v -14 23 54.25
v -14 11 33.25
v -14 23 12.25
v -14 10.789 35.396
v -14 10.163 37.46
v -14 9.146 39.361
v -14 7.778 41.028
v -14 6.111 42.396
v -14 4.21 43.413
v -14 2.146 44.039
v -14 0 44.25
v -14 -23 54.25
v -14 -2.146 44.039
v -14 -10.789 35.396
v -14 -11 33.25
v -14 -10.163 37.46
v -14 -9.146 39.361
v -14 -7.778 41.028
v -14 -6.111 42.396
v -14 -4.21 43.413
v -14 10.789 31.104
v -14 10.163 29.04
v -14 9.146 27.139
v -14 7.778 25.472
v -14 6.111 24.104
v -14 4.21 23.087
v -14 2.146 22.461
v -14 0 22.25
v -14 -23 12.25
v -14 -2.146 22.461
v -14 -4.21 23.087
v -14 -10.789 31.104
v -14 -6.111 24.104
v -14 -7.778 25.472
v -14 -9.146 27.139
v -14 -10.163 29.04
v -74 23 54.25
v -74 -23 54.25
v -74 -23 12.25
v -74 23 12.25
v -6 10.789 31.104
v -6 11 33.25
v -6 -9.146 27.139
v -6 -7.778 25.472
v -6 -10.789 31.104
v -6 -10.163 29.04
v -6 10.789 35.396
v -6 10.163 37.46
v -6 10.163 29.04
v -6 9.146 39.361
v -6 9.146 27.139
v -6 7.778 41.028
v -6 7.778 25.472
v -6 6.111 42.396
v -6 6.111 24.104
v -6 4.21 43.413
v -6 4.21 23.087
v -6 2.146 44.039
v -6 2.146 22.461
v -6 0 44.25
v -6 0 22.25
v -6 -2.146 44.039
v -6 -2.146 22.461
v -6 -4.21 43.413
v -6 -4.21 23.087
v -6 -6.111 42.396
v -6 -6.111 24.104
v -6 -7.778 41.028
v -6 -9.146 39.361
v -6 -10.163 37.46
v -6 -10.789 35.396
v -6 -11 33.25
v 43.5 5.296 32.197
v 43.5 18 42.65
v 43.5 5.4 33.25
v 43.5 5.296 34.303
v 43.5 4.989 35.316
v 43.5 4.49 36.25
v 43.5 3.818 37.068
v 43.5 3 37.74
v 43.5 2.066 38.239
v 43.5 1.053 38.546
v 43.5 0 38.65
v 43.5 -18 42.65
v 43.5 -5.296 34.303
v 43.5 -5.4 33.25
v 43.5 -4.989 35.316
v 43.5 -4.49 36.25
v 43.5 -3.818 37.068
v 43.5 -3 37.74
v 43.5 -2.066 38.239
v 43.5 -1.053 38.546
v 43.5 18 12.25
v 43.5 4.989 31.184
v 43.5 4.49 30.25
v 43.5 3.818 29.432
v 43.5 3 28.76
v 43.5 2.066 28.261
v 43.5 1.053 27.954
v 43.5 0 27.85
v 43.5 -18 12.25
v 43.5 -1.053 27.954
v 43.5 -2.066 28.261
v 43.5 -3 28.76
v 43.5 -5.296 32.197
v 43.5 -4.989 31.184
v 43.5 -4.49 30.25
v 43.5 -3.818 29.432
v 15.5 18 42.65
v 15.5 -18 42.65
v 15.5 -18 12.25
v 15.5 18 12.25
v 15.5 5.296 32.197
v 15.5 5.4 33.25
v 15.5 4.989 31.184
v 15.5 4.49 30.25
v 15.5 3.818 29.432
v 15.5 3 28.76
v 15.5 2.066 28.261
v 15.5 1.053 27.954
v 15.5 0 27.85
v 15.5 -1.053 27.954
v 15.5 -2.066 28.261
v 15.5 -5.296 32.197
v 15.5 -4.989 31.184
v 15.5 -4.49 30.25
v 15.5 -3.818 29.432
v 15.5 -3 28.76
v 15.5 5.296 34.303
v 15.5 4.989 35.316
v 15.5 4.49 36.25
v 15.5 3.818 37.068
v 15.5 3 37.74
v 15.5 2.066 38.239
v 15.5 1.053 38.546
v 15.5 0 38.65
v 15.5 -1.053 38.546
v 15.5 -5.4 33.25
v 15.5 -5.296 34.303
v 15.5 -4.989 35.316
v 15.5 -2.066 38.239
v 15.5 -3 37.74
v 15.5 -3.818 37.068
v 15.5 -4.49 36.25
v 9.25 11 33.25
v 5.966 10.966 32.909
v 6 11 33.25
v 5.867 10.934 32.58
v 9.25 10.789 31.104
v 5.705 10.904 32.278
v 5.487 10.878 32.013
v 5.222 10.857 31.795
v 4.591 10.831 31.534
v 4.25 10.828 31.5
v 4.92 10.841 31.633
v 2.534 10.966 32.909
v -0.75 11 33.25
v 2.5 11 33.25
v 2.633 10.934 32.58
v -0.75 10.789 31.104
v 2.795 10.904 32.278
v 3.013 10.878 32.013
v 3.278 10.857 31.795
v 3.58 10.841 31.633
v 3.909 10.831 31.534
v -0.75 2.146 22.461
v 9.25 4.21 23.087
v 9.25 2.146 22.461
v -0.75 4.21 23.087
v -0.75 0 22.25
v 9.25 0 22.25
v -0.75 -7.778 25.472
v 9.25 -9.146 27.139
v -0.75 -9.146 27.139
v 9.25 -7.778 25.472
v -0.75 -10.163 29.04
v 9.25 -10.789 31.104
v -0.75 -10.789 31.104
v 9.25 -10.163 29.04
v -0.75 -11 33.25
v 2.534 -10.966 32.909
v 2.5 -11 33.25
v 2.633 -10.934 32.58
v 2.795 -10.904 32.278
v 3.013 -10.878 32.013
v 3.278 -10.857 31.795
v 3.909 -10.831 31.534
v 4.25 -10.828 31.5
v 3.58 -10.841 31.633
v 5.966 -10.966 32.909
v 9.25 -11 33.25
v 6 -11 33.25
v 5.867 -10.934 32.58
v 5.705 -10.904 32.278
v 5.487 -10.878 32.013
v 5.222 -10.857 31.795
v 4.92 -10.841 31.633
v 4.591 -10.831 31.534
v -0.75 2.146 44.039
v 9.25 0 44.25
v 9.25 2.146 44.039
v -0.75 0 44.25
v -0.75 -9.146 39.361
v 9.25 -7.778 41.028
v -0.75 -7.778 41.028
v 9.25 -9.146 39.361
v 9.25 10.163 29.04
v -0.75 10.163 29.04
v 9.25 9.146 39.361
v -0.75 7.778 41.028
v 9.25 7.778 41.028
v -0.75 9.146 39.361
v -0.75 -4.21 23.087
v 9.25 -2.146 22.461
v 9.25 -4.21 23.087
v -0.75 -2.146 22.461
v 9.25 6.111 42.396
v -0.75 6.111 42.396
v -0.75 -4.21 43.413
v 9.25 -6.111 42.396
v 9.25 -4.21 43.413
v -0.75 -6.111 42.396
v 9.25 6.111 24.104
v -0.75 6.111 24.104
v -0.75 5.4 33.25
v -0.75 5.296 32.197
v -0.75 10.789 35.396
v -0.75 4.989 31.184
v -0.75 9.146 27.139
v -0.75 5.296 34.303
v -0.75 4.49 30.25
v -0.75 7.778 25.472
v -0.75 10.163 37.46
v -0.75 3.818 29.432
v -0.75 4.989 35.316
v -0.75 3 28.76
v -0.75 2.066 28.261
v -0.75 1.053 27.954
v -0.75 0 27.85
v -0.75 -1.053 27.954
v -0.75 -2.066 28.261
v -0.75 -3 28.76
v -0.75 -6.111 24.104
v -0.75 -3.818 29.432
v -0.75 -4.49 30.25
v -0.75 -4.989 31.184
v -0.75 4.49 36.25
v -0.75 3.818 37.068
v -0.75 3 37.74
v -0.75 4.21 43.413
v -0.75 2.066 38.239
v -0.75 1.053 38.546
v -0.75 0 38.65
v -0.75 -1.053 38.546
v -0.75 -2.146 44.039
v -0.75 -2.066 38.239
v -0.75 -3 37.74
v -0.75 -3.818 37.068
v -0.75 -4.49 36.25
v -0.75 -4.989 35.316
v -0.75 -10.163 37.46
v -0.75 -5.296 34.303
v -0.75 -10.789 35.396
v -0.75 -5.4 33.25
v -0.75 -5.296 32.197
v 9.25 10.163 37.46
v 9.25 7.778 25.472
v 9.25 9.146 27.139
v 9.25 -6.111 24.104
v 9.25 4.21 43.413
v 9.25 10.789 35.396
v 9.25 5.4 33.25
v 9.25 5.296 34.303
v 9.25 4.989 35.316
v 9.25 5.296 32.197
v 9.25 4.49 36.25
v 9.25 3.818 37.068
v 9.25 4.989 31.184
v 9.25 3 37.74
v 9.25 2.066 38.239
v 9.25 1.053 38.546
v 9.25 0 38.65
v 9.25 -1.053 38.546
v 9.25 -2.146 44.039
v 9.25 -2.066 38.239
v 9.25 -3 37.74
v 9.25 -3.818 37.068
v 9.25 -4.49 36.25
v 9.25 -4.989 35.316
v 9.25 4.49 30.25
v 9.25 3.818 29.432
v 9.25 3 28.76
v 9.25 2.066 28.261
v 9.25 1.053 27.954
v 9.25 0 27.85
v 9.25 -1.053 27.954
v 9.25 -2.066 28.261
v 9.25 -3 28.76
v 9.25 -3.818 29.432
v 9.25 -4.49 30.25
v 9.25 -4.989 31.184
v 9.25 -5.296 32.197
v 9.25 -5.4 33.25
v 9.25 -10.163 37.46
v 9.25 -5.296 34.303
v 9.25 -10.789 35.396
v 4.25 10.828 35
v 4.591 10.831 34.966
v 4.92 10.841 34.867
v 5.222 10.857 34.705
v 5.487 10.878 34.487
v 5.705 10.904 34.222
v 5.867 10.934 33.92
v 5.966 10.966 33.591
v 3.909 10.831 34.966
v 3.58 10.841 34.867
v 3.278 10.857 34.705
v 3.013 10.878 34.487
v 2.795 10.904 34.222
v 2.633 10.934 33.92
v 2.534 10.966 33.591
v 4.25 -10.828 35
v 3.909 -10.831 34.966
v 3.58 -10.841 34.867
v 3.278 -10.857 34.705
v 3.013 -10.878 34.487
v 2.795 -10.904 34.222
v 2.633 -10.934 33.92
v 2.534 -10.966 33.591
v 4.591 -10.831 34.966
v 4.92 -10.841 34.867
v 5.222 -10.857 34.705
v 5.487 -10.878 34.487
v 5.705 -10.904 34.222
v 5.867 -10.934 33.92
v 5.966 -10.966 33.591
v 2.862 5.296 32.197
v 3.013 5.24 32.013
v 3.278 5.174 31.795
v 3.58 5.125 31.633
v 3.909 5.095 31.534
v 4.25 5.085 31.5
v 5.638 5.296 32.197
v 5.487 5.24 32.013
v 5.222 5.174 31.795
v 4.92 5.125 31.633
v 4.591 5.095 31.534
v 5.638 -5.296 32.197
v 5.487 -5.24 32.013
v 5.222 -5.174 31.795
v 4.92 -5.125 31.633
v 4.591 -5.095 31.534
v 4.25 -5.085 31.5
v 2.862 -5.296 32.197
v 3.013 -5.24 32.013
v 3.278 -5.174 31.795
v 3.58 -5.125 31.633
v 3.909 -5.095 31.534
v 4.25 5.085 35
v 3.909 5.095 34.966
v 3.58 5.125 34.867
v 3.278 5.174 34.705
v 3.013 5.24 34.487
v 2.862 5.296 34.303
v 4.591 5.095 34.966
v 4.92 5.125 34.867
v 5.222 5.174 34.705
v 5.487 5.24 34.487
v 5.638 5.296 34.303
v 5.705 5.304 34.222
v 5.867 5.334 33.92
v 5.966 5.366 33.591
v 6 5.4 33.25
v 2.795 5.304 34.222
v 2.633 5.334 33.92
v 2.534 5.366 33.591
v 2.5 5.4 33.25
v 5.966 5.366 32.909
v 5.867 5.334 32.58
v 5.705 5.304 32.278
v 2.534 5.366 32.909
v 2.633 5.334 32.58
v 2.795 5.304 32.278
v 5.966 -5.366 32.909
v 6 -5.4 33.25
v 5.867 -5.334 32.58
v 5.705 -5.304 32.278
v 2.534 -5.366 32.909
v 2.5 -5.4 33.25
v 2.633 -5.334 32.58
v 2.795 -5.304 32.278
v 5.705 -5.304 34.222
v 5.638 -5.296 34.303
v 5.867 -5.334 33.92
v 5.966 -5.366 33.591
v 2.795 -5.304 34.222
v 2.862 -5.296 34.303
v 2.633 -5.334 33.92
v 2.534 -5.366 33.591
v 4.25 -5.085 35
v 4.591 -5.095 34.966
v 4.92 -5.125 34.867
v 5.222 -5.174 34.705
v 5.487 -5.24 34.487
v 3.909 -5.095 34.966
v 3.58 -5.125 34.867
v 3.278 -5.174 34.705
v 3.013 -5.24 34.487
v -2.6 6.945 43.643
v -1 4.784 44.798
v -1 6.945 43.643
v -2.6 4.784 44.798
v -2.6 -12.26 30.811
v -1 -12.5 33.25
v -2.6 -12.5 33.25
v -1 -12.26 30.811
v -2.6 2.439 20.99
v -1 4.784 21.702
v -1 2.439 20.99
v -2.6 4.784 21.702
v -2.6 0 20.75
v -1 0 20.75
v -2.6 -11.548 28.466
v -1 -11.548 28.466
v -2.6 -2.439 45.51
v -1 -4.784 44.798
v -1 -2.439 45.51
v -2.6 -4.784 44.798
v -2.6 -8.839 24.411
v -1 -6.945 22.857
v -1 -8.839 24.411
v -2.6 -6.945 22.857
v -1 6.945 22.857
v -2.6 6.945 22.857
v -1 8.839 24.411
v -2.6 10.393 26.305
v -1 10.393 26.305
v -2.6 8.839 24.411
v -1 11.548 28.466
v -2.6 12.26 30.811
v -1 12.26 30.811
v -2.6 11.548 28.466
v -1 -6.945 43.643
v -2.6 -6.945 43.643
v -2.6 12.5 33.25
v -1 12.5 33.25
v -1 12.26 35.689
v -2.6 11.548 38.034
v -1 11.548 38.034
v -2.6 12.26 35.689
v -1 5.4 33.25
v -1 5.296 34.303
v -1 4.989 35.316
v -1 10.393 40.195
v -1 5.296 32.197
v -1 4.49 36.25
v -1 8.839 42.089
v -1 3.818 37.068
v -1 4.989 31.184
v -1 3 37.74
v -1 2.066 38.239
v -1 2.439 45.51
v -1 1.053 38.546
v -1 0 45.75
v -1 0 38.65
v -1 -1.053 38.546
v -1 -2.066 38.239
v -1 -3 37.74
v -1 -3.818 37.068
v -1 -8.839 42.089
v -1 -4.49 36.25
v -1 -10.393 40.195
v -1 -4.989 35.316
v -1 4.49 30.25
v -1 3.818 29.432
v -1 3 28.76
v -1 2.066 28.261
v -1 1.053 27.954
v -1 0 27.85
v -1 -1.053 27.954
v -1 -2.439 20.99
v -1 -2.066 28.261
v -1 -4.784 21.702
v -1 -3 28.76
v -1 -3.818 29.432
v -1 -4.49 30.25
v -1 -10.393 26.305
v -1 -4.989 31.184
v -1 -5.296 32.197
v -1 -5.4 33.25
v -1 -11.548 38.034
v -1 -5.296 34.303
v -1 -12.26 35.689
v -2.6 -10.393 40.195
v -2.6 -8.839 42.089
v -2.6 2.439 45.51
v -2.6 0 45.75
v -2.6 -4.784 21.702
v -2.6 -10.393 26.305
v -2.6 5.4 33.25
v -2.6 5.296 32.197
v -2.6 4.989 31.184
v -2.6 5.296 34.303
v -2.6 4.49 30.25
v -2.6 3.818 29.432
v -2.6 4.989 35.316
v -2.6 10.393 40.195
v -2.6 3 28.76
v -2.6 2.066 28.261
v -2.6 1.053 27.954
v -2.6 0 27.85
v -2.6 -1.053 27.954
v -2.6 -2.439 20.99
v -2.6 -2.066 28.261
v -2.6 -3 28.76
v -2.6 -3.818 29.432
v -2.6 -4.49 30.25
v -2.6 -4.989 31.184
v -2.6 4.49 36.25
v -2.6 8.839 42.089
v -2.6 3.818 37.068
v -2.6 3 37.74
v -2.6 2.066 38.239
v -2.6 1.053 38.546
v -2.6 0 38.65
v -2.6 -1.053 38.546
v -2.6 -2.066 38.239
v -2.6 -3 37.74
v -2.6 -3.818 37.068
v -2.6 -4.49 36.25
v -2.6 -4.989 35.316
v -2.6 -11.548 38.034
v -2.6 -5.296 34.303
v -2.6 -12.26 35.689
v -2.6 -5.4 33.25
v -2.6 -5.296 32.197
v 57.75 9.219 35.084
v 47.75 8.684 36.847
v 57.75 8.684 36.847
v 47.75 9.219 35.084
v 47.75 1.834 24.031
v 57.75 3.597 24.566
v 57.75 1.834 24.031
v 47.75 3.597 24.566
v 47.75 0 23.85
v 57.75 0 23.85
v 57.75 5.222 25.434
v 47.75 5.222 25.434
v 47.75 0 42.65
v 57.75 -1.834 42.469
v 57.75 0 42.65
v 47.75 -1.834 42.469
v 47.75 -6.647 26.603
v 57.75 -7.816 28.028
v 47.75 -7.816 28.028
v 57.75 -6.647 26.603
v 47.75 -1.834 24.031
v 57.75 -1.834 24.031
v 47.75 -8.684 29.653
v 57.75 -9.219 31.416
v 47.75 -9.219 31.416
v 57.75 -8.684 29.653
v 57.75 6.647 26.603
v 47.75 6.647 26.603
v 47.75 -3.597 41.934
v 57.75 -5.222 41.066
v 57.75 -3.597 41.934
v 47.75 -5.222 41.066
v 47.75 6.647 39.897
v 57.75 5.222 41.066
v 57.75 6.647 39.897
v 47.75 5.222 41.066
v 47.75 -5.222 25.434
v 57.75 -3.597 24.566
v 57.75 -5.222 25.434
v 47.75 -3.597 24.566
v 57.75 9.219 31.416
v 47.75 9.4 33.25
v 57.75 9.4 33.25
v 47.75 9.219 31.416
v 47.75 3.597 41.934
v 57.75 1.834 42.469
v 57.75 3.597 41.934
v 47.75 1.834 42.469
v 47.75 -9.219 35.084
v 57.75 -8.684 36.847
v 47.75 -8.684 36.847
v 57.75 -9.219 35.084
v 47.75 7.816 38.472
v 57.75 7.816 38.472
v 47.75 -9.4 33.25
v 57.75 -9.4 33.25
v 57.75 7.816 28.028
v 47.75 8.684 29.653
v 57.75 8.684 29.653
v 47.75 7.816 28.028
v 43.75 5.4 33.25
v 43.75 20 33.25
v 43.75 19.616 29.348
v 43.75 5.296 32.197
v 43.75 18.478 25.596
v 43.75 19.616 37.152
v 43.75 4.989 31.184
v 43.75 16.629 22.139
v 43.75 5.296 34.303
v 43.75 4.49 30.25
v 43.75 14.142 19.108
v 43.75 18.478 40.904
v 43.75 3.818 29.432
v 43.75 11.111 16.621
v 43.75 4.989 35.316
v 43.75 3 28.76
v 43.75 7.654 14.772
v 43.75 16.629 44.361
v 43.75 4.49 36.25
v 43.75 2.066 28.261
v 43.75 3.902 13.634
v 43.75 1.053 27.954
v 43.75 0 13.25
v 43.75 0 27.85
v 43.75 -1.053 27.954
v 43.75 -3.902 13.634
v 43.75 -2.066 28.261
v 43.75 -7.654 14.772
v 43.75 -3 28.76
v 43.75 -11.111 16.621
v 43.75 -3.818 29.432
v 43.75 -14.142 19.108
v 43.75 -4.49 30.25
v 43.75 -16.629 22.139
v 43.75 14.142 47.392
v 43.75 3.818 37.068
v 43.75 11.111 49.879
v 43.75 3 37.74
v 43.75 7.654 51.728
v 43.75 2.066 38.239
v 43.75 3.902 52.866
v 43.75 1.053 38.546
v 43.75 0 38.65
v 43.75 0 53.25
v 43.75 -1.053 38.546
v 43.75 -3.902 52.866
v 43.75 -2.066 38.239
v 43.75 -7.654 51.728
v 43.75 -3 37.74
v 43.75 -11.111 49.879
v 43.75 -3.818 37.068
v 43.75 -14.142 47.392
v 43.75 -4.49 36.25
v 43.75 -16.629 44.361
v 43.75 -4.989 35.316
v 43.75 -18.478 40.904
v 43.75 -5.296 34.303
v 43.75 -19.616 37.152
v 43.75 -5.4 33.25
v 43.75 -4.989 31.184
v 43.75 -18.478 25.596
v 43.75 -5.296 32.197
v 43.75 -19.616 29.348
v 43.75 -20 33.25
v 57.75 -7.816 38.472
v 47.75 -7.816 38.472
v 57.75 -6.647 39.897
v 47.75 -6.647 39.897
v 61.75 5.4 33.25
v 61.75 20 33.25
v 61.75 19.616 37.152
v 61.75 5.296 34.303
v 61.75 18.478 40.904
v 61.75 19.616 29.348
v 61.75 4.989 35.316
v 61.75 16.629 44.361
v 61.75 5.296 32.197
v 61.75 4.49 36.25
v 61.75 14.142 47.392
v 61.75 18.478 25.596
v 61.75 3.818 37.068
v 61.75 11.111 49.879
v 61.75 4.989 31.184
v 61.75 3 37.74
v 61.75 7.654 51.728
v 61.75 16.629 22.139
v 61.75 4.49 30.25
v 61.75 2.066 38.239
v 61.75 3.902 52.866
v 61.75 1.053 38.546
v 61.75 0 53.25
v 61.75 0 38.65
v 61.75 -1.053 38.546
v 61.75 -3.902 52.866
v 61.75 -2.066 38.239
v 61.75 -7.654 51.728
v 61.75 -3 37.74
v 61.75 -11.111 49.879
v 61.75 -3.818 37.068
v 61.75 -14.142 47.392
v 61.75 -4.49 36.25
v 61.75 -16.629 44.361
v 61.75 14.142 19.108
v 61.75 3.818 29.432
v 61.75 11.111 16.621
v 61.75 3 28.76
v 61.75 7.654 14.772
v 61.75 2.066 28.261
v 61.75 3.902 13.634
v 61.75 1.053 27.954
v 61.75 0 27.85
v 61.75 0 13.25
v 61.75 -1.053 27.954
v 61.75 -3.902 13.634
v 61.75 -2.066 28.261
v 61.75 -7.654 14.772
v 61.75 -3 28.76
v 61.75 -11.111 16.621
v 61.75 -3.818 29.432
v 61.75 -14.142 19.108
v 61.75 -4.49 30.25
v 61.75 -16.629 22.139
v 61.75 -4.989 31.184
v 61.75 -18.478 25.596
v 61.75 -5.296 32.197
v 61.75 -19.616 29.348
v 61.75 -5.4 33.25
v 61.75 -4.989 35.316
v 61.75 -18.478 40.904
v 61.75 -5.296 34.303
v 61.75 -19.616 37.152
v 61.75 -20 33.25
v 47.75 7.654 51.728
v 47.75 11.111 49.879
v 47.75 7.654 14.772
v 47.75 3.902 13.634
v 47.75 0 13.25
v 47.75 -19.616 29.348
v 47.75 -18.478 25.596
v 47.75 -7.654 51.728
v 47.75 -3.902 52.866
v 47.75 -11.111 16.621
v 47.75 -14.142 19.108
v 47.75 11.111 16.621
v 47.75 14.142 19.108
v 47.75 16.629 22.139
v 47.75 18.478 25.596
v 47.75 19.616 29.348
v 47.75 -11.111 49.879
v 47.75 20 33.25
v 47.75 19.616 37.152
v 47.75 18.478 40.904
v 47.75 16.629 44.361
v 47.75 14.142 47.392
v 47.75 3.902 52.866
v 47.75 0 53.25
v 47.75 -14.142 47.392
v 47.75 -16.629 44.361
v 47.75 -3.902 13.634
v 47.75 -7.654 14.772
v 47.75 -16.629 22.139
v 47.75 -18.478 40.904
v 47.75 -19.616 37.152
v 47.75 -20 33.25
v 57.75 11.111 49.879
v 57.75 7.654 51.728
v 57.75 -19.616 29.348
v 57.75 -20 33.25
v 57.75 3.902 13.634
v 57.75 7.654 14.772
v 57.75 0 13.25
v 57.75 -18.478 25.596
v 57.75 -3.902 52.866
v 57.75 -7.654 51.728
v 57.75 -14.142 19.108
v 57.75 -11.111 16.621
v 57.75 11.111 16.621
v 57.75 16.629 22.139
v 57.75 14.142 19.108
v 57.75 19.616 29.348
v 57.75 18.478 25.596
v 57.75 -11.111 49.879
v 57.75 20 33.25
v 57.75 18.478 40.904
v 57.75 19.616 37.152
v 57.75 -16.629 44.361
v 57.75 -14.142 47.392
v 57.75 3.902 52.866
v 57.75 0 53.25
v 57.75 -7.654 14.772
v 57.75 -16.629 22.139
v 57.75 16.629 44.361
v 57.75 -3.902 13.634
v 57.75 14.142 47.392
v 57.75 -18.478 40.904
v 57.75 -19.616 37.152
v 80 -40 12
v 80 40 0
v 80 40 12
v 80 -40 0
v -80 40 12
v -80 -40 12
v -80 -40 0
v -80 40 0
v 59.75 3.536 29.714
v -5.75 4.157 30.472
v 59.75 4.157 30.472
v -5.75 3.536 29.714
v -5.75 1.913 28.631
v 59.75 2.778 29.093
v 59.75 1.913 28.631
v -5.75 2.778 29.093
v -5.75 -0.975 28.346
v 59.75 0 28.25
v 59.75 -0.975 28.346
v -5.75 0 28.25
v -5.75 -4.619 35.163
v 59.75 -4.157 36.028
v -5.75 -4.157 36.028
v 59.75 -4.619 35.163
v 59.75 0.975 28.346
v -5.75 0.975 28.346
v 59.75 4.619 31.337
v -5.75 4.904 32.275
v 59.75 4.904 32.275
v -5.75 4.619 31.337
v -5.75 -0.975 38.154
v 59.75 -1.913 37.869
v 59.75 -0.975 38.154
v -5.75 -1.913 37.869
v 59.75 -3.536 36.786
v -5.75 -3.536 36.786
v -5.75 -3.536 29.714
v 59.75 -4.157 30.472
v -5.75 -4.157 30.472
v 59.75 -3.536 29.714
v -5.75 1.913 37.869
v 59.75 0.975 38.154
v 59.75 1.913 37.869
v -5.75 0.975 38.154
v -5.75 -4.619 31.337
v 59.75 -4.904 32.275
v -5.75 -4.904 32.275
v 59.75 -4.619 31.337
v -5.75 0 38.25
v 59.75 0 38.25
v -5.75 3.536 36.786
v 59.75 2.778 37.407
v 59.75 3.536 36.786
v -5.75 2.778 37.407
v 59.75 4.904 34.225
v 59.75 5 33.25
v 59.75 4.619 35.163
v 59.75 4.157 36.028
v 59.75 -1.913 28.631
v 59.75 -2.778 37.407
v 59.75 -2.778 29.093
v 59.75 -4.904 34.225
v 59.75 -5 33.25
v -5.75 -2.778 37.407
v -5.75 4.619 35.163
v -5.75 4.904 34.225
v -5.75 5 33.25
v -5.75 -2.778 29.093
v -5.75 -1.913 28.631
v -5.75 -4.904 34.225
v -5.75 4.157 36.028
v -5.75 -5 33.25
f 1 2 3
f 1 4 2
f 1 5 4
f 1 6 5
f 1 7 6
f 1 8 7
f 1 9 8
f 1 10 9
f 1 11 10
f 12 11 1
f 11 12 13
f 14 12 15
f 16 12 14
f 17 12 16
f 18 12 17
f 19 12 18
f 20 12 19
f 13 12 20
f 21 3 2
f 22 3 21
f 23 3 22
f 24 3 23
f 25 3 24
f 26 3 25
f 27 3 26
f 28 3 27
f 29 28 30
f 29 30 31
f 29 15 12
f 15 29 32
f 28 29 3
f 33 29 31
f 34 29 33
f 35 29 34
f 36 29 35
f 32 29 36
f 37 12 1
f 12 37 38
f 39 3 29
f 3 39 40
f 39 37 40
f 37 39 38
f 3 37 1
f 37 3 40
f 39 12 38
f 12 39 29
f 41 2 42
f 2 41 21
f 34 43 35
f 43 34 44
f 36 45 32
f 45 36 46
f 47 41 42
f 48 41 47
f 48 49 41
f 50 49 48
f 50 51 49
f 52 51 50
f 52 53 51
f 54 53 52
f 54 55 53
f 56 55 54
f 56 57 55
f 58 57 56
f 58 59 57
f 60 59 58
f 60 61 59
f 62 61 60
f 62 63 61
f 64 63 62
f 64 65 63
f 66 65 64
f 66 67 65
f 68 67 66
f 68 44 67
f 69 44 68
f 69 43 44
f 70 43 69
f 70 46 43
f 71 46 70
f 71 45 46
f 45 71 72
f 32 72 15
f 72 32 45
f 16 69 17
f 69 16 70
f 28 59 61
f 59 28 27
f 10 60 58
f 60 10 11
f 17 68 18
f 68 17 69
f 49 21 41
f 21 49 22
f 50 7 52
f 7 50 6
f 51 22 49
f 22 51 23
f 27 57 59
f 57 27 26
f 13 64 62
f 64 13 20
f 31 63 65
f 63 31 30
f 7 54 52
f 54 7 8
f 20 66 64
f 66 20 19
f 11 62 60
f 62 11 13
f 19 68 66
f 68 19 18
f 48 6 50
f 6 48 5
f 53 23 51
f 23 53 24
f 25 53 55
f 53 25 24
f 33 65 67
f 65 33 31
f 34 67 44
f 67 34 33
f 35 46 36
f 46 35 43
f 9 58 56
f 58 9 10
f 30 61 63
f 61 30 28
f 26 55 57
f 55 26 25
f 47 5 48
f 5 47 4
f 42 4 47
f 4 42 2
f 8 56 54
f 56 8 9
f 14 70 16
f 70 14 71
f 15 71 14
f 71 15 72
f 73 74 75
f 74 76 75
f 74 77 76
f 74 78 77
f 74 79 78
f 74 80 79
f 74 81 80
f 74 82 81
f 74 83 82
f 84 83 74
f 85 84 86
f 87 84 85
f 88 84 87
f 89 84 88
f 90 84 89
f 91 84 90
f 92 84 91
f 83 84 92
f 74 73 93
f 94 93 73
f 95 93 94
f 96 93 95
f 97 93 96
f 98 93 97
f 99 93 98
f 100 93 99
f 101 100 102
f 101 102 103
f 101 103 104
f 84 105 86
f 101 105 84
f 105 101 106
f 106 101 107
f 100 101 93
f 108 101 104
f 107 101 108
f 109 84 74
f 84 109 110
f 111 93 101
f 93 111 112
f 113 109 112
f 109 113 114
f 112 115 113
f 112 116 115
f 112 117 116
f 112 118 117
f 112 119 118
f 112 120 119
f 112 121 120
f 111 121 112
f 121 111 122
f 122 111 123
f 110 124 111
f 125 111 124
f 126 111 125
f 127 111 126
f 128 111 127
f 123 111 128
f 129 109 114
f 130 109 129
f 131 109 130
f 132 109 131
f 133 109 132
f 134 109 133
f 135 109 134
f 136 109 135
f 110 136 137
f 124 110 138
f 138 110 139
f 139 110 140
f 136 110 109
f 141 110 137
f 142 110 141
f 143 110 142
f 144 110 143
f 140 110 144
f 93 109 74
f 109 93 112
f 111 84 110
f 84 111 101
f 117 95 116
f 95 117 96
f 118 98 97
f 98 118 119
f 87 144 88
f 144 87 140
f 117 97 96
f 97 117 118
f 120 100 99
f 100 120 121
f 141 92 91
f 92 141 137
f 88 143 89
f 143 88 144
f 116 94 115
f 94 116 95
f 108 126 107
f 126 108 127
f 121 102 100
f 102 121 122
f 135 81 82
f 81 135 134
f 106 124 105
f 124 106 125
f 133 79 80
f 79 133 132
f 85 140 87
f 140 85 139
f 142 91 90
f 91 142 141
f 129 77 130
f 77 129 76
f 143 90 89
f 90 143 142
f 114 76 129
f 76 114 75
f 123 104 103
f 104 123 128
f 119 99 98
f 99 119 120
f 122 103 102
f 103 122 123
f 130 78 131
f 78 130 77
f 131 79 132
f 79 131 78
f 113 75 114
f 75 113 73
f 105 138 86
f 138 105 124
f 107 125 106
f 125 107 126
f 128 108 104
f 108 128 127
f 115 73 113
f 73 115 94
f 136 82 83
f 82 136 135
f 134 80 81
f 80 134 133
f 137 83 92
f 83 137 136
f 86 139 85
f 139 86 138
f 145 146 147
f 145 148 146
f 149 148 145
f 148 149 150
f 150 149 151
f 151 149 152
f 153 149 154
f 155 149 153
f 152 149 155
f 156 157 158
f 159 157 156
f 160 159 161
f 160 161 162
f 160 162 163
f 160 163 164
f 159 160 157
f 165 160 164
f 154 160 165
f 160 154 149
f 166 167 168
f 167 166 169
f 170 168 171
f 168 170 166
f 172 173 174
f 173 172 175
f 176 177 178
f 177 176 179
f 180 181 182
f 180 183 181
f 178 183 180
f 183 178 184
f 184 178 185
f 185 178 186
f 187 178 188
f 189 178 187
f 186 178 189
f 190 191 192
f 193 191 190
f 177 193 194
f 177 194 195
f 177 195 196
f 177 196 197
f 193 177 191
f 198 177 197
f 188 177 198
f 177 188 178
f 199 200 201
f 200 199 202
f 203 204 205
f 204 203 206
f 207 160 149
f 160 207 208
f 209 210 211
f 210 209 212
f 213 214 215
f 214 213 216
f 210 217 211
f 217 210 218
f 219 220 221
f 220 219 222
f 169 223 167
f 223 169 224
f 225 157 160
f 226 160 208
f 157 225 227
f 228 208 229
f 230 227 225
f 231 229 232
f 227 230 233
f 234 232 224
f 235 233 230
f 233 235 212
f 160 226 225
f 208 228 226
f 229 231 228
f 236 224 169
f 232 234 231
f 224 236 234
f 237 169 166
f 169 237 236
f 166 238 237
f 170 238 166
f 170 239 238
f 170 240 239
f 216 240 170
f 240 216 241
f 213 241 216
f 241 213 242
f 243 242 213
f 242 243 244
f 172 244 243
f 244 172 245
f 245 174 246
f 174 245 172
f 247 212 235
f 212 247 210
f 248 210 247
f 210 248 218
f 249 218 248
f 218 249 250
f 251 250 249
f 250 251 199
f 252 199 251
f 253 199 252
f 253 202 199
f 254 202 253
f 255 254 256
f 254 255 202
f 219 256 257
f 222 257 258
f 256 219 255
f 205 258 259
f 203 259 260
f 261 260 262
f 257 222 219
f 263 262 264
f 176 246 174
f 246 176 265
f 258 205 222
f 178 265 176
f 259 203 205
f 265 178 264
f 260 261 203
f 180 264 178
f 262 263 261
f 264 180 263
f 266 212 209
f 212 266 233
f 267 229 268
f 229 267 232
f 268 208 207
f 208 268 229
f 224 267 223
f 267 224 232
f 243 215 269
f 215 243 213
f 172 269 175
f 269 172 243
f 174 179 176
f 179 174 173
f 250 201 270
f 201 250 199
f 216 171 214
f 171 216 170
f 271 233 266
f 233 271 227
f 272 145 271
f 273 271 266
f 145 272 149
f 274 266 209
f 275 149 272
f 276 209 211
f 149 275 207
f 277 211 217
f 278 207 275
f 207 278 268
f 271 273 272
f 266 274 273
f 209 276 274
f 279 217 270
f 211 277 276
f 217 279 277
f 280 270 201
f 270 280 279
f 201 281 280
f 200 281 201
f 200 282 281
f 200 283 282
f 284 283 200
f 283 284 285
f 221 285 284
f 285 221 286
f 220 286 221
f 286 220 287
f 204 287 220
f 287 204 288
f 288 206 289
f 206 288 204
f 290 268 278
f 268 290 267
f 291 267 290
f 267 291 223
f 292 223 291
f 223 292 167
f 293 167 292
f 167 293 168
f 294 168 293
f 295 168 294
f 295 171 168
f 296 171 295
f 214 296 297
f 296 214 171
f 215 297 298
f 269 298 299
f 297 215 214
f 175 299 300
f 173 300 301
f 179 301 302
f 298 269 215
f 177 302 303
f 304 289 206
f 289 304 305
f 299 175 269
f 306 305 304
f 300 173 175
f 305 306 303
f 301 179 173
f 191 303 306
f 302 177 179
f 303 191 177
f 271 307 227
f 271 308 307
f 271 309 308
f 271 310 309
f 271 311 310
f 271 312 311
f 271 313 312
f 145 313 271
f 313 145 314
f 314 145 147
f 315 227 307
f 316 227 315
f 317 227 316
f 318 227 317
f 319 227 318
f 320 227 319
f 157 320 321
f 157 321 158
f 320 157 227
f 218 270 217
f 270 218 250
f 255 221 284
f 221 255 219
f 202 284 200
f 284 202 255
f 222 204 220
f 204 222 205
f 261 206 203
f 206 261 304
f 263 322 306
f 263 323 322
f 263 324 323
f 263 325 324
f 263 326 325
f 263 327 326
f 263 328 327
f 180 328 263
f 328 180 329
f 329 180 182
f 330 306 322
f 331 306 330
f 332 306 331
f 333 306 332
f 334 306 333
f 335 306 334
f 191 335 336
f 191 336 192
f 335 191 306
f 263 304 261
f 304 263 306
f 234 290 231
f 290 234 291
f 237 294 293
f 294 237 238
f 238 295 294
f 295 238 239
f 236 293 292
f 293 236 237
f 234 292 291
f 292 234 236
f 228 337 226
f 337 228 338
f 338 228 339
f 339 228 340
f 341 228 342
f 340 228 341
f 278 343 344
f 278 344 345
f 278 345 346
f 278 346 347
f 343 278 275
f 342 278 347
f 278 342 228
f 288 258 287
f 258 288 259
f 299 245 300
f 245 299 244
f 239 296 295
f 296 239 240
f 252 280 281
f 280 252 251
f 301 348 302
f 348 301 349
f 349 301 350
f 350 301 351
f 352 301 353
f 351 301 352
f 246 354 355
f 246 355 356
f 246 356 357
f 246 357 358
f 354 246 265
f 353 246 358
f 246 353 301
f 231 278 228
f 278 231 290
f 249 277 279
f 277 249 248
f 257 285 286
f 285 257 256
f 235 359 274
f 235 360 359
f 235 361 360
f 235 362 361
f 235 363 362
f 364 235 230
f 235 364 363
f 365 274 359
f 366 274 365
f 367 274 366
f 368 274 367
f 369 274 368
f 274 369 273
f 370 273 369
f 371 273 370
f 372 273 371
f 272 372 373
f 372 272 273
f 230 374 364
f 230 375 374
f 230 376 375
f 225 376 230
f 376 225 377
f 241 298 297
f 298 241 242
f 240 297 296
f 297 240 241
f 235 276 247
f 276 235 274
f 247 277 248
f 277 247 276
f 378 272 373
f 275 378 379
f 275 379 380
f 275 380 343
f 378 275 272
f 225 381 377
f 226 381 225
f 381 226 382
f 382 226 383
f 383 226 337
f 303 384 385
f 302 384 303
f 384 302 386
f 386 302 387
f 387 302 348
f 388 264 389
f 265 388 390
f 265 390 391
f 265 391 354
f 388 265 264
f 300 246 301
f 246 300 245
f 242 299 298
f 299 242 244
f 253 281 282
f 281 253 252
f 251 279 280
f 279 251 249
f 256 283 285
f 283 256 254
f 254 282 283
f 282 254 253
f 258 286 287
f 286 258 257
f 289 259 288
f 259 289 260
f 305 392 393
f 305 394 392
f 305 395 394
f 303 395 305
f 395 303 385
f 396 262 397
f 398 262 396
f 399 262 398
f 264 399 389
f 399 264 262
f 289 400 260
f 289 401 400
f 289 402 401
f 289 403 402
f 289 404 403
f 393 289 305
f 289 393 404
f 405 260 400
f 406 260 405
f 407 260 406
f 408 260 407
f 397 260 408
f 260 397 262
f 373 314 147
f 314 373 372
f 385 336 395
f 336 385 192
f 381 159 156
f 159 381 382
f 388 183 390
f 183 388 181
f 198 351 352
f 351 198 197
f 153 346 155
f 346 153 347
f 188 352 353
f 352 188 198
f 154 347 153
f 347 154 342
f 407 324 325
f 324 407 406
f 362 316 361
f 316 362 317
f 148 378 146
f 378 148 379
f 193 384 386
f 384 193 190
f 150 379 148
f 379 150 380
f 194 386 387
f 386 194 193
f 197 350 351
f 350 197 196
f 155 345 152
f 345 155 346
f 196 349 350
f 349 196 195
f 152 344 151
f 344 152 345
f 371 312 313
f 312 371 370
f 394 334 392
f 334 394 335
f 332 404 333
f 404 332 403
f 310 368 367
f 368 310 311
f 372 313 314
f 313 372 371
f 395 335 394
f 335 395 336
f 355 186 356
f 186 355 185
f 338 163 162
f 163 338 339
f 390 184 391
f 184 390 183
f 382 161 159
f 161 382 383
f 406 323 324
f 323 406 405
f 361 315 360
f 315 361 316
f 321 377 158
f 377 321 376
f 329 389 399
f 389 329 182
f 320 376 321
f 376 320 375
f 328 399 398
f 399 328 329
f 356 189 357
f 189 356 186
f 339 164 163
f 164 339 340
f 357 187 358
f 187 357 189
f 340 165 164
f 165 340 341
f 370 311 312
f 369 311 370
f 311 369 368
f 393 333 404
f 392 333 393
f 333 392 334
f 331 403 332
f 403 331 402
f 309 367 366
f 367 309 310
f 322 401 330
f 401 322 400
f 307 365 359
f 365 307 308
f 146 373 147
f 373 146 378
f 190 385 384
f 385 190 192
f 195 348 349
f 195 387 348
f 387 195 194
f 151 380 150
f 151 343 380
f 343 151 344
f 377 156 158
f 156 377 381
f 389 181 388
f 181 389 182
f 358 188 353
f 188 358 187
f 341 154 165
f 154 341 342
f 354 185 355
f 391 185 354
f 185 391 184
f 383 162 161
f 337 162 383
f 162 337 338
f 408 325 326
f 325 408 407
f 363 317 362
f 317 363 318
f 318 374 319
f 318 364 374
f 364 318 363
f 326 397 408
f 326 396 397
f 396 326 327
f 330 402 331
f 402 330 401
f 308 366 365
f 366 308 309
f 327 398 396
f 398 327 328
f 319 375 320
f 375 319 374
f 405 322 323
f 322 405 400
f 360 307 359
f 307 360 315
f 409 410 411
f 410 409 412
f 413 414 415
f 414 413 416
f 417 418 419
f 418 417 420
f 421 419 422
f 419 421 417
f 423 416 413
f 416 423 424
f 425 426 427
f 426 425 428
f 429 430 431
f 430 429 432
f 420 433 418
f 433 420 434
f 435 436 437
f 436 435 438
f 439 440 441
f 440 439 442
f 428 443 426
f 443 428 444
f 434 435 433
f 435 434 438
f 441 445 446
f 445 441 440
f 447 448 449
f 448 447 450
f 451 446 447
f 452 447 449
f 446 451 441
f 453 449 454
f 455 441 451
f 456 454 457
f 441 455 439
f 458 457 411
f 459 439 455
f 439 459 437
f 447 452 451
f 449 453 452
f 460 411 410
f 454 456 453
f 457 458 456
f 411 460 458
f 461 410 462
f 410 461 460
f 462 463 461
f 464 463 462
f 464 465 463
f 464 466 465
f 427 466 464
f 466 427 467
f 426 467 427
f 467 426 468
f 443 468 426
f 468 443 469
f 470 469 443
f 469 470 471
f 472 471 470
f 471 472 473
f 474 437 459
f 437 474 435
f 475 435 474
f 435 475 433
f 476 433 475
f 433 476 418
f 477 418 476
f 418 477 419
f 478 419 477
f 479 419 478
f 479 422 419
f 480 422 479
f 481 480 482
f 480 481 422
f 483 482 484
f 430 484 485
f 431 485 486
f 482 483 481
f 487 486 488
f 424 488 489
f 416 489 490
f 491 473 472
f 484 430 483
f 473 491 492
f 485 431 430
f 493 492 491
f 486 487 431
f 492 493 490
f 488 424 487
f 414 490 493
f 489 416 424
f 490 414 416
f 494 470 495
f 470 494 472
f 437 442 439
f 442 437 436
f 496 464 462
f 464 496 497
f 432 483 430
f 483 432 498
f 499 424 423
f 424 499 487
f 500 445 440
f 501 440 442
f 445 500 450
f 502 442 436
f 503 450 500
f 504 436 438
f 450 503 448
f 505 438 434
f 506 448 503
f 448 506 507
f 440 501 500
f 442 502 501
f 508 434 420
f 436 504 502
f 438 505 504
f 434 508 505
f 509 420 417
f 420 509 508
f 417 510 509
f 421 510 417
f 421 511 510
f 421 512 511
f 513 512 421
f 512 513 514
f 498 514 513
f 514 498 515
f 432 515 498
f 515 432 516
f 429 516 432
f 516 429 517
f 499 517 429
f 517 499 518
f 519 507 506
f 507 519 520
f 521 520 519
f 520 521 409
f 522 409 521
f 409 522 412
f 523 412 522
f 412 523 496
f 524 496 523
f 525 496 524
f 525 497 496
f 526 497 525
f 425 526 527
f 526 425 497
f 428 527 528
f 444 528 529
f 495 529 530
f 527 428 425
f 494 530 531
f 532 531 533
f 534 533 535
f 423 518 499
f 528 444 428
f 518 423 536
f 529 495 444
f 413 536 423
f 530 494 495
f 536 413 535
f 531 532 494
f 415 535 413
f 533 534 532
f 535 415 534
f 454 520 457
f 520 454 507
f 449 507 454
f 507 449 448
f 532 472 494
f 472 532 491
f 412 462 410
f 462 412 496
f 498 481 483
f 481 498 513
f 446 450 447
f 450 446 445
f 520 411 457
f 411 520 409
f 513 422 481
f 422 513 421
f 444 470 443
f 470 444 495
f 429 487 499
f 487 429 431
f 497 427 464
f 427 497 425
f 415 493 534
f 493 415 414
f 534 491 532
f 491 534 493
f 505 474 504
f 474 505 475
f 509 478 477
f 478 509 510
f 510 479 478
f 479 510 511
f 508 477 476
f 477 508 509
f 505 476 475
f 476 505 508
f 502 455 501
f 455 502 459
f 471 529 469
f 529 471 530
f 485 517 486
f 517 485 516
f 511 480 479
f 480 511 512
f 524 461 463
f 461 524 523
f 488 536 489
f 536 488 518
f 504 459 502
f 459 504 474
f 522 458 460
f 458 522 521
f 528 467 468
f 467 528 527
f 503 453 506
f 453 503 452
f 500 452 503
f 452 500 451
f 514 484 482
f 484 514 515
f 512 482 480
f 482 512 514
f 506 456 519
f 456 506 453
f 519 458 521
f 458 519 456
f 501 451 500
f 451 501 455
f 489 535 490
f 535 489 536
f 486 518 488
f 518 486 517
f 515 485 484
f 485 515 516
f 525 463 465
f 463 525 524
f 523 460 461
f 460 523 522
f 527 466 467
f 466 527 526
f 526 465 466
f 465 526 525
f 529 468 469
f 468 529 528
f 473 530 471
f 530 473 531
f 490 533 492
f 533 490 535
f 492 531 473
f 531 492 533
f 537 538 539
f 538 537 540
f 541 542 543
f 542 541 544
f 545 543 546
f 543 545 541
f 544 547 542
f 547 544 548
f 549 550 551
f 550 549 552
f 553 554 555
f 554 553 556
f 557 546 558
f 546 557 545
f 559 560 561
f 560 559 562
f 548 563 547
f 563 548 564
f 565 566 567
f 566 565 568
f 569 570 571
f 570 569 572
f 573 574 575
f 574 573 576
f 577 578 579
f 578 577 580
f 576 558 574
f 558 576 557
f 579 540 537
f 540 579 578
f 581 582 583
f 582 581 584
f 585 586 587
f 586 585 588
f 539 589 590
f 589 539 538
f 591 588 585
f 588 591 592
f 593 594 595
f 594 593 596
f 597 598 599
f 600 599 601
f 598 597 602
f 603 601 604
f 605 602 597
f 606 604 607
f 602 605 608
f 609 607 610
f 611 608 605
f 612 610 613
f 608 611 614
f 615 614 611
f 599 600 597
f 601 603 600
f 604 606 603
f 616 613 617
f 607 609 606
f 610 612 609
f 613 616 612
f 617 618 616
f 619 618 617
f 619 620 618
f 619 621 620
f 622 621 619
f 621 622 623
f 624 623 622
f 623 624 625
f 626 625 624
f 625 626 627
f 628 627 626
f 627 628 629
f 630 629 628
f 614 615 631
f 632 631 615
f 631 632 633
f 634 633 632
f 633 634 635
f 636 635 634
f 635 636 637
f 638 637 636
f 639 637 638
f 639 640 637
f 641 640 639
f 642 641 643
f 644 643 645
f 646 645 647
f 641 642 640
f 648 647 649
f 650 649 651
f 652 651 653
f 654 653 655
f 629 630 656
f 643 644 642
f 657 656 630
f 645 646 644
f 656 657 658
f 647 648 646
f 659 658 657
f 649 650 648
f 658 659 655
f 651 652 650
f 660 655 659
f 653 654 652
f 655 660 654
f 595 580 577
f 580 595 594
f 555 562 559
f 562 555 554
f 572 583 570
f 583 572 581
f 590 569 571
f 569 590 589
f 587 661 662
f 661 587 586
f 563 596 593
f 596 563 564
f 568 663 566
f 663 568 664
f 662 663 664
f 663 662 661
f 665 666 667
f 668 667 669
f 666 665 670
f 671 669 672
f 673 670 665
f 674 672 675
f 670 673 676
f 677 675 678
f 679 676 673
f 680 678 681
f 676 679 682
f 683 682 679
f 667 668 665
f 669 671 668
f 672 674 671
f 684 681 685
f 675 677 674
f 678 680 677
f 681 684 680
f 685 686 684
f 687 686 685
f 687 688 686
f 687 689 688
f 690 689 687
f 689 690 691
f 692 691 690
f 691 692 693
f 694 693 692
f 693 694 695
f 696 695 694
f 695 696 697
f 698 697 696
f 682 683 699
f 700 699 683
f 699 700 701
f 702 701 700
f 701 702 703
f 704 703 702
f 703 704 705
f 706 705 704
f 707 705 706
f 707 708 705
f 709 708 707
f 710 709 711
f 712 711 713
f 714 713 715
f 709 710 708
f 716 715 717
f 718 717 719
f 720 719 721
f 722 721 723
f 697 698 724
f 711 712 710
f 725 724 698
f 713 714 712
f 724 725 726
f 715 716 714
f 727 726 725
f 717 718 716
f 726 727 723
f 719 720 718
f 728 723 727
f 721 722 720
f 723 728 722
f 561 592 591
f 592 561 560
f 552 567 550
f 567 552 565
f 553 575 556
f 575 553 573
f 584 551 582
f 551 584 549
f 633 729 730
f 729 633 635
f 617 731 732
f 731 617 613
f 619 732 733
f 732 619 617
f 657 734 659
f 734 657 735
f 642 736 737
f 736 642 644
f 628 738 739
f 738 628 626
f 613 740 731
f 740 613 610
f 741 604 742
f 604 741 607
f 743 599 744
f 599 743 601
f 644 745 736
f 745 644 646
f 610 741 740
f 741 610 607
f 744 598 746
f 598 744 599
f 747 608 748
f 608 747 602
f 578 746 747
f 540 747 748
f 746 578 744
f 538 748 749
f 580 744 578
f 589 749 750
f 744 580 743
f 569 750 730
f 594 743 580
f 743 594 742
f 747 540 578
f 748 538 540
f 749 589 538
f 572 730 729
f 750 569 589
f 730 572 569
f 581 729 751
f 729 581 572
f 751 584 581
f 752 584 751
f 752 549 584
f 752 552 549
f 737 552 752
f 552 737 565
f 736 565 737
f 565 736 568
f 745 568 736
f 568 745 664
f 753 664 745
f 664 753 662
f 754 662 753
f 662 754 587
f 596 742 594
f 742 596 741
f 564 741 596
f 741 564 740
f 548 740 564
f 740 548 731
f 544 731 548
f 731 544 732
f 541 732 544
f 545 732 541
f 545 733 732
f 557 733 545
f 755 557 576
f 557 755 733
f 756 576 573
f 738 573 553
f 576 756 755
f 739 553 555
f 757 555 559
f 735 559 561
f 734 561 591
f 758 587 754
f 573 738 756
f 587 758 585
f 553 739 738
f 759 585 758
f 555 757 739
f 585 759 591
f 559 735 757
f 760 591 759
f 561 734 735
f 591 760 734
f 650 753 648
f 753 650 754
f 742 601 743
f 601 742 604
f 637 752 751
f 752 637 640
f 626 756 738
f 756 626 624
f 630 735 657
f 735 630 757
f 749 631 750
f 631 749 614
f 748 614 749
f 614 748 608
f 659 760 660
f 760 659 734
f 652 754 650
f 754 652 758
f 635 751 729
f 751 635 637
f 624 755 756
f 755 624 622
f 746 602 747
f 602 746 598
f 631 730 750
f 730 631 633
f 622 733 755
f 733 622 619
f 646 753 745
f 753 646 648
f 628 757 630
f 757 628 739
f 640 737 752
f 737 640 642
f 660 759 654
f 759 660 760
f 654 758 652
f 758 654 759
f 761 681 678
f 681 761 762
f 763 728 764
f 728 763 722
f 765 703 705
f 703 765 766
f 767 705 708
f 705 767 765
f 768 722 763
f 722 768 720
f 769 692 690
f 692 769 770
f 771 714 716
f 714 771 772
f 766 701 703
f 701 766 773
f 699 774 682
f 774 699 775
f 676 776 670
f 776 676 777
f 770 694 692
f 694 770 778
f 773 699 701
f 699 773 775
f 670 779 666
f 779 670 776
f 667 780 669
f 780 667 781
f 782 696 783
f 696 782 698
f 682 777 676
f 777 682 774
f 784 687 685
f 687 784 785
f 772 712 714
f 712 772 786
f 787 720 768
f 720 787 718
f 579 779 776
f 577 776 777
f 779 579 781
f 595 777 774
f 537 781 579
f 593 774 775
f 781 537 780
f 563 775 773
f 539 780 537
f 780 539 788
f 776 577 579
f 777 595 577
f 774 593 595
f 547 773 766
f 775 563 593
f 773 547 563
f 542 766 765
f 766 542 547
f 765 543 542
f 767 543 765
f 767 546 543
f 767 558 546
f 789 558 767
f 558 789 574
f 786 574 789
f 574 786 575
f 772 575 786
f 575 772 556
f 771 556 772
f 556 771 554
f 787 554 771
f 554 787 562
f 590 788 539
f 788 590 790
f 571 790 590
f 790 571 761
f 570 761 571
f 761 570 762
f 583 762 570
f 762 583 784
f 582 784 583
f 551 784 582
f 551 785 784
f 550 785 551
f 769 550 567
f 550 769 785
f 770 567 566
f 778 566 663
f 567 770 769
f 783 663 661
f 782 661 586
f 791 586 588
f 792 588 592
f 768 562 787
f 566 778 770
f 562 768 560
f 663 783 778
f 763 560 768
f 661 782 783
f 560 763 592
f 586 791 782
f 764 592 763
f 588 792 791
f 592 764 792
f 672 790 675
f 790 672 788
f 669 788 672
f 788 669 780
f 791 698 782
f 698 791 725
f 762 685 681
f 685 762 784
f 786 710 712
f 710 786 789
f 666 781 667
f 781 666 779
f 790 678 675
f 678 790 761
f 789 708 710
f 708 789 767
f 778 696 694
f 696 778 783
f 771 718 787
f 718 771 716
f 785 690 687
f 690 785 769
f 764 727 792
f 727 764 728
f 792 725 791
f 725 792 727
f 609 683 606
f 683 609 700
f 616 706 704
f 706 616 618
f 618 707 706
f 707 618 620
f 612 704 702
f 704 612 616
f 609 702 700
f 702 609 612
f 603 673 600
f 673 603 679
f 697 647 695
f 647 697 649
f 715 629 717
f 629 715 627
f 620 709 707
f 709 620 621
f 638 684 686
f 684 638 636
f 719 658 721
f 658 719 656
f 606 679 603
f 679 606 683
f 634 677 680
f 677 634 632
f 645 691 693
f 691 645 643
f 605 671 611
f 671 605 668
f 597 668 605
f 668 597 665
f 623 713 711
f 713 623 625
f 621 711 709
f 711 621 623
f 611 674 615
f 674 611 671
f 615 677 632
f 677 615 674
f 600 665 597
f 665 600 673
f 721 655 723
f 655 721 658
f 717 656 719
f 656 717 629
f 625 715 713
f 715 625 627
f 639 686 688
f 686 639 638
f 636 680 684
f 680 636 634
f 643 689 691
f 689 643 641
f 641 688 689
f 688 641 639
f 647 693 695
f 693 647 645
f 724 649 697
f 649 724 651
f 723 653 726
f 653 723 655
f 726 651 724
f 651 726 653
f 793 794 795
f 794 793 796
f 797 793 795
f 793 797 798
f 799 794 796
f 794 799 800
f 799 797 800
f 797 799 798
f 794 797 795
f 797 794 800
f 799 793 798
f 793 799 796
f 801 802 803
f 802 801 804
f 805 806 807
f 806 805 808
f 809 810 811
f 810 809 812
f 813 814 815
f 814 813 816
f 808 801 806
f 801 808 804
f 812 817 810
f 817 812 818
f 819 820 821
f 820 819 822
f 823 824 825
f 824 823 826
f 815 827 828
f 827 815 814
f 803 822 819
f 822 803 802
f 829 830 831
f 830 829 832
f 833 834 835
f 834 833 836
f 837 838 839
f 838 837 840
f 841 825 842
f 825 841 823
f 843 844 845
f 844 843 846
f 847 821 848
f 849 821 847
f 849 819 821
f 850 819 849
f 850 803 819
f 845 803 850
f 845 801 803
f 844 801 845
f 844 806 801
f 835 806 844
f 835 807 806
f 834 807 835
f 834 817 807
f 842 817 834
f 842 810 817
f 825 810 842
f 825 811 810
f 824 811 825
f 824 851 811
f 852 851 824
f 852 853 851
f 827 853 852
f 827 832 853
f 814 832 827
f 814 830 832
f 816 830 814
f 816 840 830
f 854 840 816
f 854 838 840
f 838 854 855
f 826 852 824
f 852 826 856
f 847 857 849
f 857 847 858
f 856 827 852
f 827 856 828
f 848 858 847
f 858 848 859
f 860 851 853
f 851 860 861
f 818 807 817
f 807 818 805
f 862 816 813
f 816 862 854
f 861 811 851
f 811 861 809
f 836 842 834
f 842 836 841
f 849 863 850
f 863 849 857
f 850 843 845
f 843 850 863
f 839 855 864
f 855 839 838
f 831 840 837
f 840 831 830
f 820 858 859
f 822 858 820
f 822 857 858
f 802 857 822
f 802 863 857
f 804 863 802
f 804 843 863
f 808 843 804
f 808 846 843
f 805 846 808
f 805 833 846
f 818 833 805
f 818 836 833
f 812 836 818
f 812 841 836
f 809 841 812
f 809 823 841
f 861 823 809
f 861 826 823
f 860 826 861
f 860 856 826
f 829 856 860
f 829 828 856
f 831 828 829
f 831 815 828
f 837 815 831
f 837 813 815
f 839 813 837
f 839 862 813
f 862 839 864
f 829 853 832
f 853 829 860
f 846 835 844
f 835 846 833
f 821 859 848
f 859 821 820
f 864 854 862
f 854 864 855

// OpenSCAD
$fn = 32;

// ------------------------------------------------------------------------
// Motor drive station: motor 60 x 42 mm, shaft d10, pulley d40
// Every part is its own module, assembly() places every instance.
// ------------------------------------------------------------------------

// --- part 1 ---
module station_bed() {
  difference() {
    translate([-80, -40, 0]) cube([160, 80, 12]);
  }
}

// --- part 2 ---
module drive_motor() {
  union() {
    translate([-30, -23, 0]) cube([60, 46, 42]);
    translate([34, 0, 21]) rotate([0, 90, 0]) cylinder(h = 8, d = 22, center = true);
  }
}

// --- part 3 ---
module pillow_block() {
  difference() {
    translate([-14, -18, 0]) cube([28, 36, 30.4]);
    translate([0, 0, 21]) rotate([0, 90, 0]) cylinder(h = 30, d = 10.8, center = true);
  }
}

// --- part 4 ---
module drive_shaft() {
  translate([0, 0, -32.75]) cylinder(h = 65.5, d = 10);
}

// --- part 5 ---
module shaft_collar() {
  difference() {
    cylinder(h = 10, d = 22);
    translate([0, 0, -1]) cylinder(h = 12, d = 10.8);
    translate([0, 0, 5]) rotate([90, 0, 0]) cylinder(h = 24, d = 3.5, center = true);
  }
}

// --- part 6 ---
module collar_washer() {
  difference() {
      translate([0, 0, 0]) cylinder(h = 1.6, d = 25);
      translate([0, 0, -1]) cylinder(h = 3.6, d = 10.8);
    }
}

// --- part 7 ---
module drive_pulley() {
  difference() {
    union() {
      cylinder(h = 18, d = 18.8);
      cylinder(h = 4, d = 40);
      translate([0, 0, 14]) cylinder(h = 4, d = 40);
    }
    translate([0, 0, -1]) cylinder(h = 20, d = 10.8);
  }
}

// --- assembly ---
module assembly() {
  color([0.80, 0.24, 0.20]) translate([0, 0, 0]) rotate([0, 0, 0]) station_bed();
  color([0.20, 0.45, 0.75]) translate([-44, 0, 12.25]) rotate([0, 0, 0]) drive_motor();
  color([0.25, 0.62, 0.32]) translate([29.5, 0, 12.25]) rotate([0, 0, 0]) pillow_block();
  color([0.92, 0.70, 0.18]) translate([27, 0, 33.25]) rotate([0, 90, 0]) drive_shaft();
  color([0.58, 0.35, 0.70]) translate([-0.75, 0, 33.25]) rotate([0, 90, 0]) shaft_collar();
  color([0.16, 0.66, 0.66]) translate([-2.6, 0, 33.25]) rotate([0, 90, 0]) collar_washer();
  color([0.85, 0.48, 0.18]) translate([43.75, 0, 33.25]) rotate([0, 90, 0]) drive_pulley();
}

assembly();
